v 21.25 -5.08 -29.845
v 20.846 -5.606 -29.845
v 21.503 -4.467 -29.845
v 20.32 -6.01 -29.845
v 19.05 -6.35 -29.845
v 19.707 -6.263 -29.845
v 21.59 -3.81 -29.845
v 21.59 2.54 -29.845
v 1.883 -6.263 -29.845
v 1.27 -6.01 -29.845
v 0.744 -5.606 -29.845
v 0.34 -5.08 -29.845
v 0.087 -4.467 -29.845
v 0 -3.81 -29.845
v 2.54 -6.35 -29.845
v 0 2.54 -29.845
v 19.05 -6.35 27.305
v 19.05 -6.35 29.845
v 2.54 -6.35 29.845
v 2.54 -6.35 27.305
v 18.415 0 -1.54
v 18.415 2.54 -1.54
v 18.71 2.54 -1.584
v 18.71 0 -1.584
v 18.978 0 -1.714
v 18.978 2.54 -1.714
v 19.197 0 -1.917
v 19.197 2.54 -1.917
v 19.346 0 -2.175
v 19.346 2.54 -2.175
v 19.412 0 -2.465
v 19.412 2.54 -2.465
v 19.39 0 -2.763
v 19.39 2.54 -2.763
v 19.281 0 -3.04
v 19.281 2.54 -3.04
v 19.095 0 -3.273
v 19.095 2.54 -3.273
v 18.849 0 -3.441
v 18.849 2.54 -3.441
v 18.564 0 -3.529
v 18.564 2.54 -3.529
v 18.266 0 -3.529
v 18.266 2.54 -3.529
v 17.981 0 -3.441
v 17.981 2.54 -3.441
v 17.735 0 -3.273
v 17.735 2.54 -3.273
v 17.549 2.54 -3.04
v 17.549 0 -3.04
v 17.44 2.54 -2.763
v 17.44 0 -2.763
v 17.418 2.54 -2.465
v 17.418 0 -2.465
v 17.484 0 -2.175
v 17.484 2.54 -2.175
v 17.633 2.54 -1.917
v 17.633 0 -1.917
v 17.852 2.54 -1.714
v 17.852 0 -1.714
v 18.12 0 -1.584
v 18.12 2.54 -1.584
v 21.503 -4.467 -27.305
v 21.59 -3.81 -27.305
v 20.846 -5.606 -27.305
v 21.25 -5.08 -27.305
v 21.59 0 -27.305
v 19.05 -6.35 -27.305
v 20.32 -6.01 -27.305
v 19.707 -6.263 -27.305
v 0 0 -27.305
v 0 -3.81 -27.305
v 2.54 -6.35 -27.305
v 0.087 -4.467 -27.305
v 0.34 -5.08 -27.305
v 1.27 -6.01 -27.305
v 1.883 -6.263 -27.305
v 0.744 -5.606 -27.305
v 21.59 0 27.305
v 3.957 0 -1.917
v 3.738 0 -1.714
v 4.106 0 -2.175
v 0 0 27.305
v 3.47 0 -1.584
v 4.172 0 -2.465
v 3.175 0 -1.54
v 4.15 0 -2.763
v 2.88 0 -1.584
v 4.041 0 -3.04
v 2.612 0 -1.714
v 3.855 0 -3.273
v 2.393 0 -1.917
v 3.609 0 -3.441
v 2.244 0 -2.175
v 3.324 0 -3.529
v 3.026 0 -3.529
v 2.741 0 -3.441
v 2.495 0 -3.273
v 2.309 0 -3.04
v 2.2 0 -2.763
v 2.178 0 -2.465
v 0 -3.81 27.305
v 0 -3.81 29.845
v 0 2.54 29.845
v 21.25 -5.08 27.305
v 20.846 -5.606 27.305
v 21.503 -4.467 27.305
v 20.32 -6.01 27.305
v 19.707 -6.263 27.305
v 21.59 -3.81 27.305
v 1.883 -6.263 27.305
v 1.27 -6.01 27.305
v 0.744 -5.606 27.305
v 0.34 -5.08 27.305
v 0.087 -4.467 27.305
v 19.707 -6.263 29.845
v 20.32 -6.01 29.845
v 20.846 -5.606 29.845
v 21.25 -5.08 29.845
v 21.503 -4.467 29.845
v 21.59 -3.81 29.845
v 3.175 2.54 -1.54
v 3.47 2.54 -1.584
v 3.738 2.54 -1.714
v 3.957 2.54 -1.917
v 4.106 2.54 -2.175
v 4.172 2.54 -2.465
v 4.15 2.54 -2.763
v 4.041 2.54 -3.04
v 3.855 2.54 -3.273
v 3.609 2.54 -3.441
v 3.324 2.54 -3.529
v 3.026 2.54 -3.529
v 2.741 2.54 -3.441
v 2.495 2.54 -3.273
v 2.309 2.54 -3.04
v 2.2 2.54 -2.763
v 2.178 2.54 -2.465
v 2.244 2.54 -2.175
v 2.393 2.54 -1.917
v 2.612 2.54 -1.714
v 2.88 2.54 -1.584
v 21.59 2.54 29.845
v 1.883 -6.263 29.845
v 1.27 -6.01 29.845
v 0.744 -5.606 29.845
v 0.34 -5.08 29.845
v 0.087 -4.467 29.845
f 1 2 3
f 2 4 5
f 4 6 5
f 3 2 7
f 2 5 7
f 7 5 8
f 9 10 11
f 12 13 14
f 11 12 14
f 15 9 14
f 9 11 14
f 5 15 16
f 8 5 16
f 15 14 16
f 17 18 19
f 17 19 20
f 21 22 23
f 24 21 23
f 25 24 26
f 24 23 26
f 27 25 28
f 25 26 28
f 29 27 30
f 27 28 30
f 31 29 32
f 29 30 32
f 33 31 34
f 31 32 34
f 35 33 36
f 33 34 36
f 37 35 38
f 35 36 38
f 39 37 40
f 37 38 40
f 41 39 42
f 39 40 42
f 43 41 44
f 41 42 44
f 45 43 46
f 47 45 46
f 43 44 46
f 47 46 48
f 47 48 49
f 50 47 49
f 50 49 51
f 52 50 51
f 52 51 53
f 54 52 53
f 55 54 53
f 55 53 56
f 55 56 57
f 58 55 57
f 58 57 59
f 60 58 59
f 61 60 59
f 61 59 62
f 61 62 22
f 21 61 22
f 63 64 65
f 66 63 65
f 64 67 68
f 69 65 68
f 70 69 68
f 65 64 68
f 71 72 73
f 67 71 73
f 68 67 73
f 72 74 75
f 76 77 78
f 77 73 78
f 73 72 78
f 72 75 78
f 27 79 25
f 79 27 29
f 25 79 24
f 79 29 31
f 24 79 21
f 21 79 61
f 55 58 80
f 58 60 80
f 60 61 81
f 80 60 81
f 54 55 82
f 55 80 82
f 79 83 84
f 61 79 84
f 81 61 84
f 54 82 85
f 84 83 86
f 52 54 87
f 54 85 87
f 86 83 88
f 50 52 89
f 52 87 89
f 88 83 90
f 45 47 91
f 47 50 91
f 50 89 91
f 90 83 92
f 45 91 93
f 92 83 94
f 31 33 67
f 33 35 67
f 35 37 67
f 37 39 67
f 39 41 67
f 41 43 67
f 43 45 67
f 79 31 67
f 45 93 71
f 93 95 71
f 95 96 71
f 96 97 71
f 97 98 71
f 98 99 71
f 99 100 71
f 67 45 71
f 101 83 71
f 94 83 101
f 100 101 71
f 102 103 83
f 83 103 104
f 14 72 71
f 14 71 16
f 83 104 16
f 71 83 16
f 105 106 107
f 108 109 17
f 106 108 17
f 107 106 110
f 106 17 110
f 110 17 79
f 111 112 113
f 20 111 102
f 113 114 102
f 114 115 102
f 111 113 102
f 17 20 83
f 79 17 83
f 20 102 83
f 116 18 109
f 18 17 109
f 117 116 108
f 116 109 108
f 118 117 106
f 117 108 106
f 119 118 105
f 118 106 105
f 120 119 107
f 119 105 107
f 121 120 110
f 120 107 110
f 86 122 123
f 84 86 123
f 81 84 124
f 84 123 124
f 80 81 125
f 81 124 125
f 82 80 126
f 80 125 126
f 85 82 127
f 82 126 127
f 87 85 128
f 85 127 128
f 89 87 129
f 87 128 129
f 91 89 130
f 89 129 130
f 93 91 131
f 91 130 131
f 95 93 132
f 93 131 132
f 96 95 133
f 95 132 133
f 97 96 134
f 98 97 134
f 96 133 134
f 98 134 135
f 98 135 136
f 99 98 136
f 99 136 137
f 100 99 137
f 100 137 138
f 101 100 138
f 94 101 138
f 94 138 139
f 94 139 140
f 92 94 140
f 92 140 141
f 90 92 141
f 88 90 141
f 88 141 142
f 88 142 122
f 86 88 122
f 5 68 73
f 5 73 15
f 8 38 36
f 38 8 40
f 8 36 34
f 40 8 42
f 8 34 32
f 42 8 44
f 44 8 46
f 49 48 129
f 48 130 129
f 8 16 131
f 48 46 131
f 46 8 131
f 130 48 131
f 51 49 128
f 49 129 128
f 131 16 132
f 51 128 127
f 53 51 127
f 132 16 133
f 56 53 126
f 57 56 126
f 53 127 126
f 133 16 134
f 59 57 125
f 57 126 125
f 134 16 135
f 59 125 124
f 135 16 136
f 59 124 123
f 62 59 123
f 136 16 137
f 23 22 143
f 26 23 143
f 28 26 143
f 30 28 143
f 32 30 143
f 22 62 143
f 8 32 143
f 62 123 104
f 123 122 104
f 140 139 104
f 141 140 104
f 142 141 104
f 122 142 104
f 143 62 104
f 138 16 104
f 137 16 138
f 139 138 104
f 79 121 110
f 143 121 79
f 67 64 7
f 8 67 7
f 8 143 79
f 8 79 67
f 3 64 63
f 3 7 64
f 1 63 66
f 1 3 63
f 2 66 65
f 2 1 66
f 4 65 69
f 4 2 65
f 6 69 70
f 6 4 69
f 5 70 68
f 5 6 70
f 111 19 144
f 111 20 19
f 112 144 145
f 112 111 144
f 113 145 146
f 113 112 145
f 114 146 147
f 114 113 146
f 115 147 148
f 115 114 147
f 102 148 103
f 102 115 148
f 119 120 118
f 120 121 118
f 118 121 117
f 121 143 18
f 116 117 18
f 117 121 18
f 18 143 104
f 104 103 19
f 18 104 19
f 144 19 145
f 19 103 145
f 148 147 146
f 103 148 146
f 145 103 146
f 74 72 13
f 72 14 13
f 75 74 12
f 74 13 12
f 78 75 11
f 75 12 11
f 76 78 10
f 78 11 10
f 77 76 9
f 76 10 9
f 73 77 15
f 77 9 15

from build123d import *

# Parameters (mm, degrees)
EXTRUDE_THIN1_DEPTH = 21.59
CUT_EXTRUDE1_REACH  = 39.893
SKETCH2_R           = 1
FILLET1_R           = 2.54


with BuildPart() as part:
    # Sketch1 → Extrude-Thin1 (new body)
    with BuildSketch(Plane(origin=(0, 0, 0), x_dir=(0, 0, -1), z_dir=(1, 0, 0))):
        Polygon((-27.305, -6.35), (-27.305, 0), (27.305, 0), (27.305, -6.35), (29.845, -6.35), (29.845, 2.54), (-29.845, 2.54), (-29.845, -6.35), align=None)
    extrude(amount=EXTRUDE_THIN1_DEPTH)

    # Sketch2 → Cut-Extrude1 (cut, up to next)
    with BuildSketch(Plane(origin=(0, 2.54, 0), x_dir=(1, 0, 0), z_dir=(0, 1, 0)), mode=Mode.PRIVATE) as cut_extrude1_sk1:
        with Locations(Location((3.175, 2.54, 0), (0, 0, 270))):
            Circle(SKETCH2_R)
    cut_extrude1_tool1 = extrude(cut_extrude1_sk1.sketch, amount=-CUT_EXTRUDE1_REACH, mode=Mode.PRIVATE) & part.part
    # Sketch2 → Cut-Extrude1 (cut, up to next)
    with BuildSketch(Plane(origin=(0, 2.54, 0), x_dir=(1, 0, 0), z_dir=(0, 1, 0)), mode=Mode.PRIVATE) as cut_extrude1_sk2:
        with Locations(Location((18.415, 2.54, 0), (0, 0, 270))):
            Circle(SKETCH2_R)
    cut_extrude1_tool2 = extrude(cut_extrude1_sk2.sketch, amount=-CUT_EXTRUDE1_REACH, mode=Mode.PRIVATE) & part.part
    add(cut_extrude1_tool1.solids().sort_by_distance((3.175, 2.54, -2.54))[0], mode=Mode.SUBTRACT)
    add(cut_extrude1_tool2.solids().sort_by_distance((18.415, 2.54, -2.54))[0], mode=Mode.SUBTRACT)

    # Fillet1
    fillet1_edges = [part.edges().sort_by_distance(p)[0] for p in [
        (21.59, -6.35, -28.575),
        (21.59, -6.35, 28.575),
        (0, -6.35, -28.575),
        (0, -6.35, 28.575),
    ]]
    fillet(fillet1_edges, radius=FILLET1_R)


solid = part.part
